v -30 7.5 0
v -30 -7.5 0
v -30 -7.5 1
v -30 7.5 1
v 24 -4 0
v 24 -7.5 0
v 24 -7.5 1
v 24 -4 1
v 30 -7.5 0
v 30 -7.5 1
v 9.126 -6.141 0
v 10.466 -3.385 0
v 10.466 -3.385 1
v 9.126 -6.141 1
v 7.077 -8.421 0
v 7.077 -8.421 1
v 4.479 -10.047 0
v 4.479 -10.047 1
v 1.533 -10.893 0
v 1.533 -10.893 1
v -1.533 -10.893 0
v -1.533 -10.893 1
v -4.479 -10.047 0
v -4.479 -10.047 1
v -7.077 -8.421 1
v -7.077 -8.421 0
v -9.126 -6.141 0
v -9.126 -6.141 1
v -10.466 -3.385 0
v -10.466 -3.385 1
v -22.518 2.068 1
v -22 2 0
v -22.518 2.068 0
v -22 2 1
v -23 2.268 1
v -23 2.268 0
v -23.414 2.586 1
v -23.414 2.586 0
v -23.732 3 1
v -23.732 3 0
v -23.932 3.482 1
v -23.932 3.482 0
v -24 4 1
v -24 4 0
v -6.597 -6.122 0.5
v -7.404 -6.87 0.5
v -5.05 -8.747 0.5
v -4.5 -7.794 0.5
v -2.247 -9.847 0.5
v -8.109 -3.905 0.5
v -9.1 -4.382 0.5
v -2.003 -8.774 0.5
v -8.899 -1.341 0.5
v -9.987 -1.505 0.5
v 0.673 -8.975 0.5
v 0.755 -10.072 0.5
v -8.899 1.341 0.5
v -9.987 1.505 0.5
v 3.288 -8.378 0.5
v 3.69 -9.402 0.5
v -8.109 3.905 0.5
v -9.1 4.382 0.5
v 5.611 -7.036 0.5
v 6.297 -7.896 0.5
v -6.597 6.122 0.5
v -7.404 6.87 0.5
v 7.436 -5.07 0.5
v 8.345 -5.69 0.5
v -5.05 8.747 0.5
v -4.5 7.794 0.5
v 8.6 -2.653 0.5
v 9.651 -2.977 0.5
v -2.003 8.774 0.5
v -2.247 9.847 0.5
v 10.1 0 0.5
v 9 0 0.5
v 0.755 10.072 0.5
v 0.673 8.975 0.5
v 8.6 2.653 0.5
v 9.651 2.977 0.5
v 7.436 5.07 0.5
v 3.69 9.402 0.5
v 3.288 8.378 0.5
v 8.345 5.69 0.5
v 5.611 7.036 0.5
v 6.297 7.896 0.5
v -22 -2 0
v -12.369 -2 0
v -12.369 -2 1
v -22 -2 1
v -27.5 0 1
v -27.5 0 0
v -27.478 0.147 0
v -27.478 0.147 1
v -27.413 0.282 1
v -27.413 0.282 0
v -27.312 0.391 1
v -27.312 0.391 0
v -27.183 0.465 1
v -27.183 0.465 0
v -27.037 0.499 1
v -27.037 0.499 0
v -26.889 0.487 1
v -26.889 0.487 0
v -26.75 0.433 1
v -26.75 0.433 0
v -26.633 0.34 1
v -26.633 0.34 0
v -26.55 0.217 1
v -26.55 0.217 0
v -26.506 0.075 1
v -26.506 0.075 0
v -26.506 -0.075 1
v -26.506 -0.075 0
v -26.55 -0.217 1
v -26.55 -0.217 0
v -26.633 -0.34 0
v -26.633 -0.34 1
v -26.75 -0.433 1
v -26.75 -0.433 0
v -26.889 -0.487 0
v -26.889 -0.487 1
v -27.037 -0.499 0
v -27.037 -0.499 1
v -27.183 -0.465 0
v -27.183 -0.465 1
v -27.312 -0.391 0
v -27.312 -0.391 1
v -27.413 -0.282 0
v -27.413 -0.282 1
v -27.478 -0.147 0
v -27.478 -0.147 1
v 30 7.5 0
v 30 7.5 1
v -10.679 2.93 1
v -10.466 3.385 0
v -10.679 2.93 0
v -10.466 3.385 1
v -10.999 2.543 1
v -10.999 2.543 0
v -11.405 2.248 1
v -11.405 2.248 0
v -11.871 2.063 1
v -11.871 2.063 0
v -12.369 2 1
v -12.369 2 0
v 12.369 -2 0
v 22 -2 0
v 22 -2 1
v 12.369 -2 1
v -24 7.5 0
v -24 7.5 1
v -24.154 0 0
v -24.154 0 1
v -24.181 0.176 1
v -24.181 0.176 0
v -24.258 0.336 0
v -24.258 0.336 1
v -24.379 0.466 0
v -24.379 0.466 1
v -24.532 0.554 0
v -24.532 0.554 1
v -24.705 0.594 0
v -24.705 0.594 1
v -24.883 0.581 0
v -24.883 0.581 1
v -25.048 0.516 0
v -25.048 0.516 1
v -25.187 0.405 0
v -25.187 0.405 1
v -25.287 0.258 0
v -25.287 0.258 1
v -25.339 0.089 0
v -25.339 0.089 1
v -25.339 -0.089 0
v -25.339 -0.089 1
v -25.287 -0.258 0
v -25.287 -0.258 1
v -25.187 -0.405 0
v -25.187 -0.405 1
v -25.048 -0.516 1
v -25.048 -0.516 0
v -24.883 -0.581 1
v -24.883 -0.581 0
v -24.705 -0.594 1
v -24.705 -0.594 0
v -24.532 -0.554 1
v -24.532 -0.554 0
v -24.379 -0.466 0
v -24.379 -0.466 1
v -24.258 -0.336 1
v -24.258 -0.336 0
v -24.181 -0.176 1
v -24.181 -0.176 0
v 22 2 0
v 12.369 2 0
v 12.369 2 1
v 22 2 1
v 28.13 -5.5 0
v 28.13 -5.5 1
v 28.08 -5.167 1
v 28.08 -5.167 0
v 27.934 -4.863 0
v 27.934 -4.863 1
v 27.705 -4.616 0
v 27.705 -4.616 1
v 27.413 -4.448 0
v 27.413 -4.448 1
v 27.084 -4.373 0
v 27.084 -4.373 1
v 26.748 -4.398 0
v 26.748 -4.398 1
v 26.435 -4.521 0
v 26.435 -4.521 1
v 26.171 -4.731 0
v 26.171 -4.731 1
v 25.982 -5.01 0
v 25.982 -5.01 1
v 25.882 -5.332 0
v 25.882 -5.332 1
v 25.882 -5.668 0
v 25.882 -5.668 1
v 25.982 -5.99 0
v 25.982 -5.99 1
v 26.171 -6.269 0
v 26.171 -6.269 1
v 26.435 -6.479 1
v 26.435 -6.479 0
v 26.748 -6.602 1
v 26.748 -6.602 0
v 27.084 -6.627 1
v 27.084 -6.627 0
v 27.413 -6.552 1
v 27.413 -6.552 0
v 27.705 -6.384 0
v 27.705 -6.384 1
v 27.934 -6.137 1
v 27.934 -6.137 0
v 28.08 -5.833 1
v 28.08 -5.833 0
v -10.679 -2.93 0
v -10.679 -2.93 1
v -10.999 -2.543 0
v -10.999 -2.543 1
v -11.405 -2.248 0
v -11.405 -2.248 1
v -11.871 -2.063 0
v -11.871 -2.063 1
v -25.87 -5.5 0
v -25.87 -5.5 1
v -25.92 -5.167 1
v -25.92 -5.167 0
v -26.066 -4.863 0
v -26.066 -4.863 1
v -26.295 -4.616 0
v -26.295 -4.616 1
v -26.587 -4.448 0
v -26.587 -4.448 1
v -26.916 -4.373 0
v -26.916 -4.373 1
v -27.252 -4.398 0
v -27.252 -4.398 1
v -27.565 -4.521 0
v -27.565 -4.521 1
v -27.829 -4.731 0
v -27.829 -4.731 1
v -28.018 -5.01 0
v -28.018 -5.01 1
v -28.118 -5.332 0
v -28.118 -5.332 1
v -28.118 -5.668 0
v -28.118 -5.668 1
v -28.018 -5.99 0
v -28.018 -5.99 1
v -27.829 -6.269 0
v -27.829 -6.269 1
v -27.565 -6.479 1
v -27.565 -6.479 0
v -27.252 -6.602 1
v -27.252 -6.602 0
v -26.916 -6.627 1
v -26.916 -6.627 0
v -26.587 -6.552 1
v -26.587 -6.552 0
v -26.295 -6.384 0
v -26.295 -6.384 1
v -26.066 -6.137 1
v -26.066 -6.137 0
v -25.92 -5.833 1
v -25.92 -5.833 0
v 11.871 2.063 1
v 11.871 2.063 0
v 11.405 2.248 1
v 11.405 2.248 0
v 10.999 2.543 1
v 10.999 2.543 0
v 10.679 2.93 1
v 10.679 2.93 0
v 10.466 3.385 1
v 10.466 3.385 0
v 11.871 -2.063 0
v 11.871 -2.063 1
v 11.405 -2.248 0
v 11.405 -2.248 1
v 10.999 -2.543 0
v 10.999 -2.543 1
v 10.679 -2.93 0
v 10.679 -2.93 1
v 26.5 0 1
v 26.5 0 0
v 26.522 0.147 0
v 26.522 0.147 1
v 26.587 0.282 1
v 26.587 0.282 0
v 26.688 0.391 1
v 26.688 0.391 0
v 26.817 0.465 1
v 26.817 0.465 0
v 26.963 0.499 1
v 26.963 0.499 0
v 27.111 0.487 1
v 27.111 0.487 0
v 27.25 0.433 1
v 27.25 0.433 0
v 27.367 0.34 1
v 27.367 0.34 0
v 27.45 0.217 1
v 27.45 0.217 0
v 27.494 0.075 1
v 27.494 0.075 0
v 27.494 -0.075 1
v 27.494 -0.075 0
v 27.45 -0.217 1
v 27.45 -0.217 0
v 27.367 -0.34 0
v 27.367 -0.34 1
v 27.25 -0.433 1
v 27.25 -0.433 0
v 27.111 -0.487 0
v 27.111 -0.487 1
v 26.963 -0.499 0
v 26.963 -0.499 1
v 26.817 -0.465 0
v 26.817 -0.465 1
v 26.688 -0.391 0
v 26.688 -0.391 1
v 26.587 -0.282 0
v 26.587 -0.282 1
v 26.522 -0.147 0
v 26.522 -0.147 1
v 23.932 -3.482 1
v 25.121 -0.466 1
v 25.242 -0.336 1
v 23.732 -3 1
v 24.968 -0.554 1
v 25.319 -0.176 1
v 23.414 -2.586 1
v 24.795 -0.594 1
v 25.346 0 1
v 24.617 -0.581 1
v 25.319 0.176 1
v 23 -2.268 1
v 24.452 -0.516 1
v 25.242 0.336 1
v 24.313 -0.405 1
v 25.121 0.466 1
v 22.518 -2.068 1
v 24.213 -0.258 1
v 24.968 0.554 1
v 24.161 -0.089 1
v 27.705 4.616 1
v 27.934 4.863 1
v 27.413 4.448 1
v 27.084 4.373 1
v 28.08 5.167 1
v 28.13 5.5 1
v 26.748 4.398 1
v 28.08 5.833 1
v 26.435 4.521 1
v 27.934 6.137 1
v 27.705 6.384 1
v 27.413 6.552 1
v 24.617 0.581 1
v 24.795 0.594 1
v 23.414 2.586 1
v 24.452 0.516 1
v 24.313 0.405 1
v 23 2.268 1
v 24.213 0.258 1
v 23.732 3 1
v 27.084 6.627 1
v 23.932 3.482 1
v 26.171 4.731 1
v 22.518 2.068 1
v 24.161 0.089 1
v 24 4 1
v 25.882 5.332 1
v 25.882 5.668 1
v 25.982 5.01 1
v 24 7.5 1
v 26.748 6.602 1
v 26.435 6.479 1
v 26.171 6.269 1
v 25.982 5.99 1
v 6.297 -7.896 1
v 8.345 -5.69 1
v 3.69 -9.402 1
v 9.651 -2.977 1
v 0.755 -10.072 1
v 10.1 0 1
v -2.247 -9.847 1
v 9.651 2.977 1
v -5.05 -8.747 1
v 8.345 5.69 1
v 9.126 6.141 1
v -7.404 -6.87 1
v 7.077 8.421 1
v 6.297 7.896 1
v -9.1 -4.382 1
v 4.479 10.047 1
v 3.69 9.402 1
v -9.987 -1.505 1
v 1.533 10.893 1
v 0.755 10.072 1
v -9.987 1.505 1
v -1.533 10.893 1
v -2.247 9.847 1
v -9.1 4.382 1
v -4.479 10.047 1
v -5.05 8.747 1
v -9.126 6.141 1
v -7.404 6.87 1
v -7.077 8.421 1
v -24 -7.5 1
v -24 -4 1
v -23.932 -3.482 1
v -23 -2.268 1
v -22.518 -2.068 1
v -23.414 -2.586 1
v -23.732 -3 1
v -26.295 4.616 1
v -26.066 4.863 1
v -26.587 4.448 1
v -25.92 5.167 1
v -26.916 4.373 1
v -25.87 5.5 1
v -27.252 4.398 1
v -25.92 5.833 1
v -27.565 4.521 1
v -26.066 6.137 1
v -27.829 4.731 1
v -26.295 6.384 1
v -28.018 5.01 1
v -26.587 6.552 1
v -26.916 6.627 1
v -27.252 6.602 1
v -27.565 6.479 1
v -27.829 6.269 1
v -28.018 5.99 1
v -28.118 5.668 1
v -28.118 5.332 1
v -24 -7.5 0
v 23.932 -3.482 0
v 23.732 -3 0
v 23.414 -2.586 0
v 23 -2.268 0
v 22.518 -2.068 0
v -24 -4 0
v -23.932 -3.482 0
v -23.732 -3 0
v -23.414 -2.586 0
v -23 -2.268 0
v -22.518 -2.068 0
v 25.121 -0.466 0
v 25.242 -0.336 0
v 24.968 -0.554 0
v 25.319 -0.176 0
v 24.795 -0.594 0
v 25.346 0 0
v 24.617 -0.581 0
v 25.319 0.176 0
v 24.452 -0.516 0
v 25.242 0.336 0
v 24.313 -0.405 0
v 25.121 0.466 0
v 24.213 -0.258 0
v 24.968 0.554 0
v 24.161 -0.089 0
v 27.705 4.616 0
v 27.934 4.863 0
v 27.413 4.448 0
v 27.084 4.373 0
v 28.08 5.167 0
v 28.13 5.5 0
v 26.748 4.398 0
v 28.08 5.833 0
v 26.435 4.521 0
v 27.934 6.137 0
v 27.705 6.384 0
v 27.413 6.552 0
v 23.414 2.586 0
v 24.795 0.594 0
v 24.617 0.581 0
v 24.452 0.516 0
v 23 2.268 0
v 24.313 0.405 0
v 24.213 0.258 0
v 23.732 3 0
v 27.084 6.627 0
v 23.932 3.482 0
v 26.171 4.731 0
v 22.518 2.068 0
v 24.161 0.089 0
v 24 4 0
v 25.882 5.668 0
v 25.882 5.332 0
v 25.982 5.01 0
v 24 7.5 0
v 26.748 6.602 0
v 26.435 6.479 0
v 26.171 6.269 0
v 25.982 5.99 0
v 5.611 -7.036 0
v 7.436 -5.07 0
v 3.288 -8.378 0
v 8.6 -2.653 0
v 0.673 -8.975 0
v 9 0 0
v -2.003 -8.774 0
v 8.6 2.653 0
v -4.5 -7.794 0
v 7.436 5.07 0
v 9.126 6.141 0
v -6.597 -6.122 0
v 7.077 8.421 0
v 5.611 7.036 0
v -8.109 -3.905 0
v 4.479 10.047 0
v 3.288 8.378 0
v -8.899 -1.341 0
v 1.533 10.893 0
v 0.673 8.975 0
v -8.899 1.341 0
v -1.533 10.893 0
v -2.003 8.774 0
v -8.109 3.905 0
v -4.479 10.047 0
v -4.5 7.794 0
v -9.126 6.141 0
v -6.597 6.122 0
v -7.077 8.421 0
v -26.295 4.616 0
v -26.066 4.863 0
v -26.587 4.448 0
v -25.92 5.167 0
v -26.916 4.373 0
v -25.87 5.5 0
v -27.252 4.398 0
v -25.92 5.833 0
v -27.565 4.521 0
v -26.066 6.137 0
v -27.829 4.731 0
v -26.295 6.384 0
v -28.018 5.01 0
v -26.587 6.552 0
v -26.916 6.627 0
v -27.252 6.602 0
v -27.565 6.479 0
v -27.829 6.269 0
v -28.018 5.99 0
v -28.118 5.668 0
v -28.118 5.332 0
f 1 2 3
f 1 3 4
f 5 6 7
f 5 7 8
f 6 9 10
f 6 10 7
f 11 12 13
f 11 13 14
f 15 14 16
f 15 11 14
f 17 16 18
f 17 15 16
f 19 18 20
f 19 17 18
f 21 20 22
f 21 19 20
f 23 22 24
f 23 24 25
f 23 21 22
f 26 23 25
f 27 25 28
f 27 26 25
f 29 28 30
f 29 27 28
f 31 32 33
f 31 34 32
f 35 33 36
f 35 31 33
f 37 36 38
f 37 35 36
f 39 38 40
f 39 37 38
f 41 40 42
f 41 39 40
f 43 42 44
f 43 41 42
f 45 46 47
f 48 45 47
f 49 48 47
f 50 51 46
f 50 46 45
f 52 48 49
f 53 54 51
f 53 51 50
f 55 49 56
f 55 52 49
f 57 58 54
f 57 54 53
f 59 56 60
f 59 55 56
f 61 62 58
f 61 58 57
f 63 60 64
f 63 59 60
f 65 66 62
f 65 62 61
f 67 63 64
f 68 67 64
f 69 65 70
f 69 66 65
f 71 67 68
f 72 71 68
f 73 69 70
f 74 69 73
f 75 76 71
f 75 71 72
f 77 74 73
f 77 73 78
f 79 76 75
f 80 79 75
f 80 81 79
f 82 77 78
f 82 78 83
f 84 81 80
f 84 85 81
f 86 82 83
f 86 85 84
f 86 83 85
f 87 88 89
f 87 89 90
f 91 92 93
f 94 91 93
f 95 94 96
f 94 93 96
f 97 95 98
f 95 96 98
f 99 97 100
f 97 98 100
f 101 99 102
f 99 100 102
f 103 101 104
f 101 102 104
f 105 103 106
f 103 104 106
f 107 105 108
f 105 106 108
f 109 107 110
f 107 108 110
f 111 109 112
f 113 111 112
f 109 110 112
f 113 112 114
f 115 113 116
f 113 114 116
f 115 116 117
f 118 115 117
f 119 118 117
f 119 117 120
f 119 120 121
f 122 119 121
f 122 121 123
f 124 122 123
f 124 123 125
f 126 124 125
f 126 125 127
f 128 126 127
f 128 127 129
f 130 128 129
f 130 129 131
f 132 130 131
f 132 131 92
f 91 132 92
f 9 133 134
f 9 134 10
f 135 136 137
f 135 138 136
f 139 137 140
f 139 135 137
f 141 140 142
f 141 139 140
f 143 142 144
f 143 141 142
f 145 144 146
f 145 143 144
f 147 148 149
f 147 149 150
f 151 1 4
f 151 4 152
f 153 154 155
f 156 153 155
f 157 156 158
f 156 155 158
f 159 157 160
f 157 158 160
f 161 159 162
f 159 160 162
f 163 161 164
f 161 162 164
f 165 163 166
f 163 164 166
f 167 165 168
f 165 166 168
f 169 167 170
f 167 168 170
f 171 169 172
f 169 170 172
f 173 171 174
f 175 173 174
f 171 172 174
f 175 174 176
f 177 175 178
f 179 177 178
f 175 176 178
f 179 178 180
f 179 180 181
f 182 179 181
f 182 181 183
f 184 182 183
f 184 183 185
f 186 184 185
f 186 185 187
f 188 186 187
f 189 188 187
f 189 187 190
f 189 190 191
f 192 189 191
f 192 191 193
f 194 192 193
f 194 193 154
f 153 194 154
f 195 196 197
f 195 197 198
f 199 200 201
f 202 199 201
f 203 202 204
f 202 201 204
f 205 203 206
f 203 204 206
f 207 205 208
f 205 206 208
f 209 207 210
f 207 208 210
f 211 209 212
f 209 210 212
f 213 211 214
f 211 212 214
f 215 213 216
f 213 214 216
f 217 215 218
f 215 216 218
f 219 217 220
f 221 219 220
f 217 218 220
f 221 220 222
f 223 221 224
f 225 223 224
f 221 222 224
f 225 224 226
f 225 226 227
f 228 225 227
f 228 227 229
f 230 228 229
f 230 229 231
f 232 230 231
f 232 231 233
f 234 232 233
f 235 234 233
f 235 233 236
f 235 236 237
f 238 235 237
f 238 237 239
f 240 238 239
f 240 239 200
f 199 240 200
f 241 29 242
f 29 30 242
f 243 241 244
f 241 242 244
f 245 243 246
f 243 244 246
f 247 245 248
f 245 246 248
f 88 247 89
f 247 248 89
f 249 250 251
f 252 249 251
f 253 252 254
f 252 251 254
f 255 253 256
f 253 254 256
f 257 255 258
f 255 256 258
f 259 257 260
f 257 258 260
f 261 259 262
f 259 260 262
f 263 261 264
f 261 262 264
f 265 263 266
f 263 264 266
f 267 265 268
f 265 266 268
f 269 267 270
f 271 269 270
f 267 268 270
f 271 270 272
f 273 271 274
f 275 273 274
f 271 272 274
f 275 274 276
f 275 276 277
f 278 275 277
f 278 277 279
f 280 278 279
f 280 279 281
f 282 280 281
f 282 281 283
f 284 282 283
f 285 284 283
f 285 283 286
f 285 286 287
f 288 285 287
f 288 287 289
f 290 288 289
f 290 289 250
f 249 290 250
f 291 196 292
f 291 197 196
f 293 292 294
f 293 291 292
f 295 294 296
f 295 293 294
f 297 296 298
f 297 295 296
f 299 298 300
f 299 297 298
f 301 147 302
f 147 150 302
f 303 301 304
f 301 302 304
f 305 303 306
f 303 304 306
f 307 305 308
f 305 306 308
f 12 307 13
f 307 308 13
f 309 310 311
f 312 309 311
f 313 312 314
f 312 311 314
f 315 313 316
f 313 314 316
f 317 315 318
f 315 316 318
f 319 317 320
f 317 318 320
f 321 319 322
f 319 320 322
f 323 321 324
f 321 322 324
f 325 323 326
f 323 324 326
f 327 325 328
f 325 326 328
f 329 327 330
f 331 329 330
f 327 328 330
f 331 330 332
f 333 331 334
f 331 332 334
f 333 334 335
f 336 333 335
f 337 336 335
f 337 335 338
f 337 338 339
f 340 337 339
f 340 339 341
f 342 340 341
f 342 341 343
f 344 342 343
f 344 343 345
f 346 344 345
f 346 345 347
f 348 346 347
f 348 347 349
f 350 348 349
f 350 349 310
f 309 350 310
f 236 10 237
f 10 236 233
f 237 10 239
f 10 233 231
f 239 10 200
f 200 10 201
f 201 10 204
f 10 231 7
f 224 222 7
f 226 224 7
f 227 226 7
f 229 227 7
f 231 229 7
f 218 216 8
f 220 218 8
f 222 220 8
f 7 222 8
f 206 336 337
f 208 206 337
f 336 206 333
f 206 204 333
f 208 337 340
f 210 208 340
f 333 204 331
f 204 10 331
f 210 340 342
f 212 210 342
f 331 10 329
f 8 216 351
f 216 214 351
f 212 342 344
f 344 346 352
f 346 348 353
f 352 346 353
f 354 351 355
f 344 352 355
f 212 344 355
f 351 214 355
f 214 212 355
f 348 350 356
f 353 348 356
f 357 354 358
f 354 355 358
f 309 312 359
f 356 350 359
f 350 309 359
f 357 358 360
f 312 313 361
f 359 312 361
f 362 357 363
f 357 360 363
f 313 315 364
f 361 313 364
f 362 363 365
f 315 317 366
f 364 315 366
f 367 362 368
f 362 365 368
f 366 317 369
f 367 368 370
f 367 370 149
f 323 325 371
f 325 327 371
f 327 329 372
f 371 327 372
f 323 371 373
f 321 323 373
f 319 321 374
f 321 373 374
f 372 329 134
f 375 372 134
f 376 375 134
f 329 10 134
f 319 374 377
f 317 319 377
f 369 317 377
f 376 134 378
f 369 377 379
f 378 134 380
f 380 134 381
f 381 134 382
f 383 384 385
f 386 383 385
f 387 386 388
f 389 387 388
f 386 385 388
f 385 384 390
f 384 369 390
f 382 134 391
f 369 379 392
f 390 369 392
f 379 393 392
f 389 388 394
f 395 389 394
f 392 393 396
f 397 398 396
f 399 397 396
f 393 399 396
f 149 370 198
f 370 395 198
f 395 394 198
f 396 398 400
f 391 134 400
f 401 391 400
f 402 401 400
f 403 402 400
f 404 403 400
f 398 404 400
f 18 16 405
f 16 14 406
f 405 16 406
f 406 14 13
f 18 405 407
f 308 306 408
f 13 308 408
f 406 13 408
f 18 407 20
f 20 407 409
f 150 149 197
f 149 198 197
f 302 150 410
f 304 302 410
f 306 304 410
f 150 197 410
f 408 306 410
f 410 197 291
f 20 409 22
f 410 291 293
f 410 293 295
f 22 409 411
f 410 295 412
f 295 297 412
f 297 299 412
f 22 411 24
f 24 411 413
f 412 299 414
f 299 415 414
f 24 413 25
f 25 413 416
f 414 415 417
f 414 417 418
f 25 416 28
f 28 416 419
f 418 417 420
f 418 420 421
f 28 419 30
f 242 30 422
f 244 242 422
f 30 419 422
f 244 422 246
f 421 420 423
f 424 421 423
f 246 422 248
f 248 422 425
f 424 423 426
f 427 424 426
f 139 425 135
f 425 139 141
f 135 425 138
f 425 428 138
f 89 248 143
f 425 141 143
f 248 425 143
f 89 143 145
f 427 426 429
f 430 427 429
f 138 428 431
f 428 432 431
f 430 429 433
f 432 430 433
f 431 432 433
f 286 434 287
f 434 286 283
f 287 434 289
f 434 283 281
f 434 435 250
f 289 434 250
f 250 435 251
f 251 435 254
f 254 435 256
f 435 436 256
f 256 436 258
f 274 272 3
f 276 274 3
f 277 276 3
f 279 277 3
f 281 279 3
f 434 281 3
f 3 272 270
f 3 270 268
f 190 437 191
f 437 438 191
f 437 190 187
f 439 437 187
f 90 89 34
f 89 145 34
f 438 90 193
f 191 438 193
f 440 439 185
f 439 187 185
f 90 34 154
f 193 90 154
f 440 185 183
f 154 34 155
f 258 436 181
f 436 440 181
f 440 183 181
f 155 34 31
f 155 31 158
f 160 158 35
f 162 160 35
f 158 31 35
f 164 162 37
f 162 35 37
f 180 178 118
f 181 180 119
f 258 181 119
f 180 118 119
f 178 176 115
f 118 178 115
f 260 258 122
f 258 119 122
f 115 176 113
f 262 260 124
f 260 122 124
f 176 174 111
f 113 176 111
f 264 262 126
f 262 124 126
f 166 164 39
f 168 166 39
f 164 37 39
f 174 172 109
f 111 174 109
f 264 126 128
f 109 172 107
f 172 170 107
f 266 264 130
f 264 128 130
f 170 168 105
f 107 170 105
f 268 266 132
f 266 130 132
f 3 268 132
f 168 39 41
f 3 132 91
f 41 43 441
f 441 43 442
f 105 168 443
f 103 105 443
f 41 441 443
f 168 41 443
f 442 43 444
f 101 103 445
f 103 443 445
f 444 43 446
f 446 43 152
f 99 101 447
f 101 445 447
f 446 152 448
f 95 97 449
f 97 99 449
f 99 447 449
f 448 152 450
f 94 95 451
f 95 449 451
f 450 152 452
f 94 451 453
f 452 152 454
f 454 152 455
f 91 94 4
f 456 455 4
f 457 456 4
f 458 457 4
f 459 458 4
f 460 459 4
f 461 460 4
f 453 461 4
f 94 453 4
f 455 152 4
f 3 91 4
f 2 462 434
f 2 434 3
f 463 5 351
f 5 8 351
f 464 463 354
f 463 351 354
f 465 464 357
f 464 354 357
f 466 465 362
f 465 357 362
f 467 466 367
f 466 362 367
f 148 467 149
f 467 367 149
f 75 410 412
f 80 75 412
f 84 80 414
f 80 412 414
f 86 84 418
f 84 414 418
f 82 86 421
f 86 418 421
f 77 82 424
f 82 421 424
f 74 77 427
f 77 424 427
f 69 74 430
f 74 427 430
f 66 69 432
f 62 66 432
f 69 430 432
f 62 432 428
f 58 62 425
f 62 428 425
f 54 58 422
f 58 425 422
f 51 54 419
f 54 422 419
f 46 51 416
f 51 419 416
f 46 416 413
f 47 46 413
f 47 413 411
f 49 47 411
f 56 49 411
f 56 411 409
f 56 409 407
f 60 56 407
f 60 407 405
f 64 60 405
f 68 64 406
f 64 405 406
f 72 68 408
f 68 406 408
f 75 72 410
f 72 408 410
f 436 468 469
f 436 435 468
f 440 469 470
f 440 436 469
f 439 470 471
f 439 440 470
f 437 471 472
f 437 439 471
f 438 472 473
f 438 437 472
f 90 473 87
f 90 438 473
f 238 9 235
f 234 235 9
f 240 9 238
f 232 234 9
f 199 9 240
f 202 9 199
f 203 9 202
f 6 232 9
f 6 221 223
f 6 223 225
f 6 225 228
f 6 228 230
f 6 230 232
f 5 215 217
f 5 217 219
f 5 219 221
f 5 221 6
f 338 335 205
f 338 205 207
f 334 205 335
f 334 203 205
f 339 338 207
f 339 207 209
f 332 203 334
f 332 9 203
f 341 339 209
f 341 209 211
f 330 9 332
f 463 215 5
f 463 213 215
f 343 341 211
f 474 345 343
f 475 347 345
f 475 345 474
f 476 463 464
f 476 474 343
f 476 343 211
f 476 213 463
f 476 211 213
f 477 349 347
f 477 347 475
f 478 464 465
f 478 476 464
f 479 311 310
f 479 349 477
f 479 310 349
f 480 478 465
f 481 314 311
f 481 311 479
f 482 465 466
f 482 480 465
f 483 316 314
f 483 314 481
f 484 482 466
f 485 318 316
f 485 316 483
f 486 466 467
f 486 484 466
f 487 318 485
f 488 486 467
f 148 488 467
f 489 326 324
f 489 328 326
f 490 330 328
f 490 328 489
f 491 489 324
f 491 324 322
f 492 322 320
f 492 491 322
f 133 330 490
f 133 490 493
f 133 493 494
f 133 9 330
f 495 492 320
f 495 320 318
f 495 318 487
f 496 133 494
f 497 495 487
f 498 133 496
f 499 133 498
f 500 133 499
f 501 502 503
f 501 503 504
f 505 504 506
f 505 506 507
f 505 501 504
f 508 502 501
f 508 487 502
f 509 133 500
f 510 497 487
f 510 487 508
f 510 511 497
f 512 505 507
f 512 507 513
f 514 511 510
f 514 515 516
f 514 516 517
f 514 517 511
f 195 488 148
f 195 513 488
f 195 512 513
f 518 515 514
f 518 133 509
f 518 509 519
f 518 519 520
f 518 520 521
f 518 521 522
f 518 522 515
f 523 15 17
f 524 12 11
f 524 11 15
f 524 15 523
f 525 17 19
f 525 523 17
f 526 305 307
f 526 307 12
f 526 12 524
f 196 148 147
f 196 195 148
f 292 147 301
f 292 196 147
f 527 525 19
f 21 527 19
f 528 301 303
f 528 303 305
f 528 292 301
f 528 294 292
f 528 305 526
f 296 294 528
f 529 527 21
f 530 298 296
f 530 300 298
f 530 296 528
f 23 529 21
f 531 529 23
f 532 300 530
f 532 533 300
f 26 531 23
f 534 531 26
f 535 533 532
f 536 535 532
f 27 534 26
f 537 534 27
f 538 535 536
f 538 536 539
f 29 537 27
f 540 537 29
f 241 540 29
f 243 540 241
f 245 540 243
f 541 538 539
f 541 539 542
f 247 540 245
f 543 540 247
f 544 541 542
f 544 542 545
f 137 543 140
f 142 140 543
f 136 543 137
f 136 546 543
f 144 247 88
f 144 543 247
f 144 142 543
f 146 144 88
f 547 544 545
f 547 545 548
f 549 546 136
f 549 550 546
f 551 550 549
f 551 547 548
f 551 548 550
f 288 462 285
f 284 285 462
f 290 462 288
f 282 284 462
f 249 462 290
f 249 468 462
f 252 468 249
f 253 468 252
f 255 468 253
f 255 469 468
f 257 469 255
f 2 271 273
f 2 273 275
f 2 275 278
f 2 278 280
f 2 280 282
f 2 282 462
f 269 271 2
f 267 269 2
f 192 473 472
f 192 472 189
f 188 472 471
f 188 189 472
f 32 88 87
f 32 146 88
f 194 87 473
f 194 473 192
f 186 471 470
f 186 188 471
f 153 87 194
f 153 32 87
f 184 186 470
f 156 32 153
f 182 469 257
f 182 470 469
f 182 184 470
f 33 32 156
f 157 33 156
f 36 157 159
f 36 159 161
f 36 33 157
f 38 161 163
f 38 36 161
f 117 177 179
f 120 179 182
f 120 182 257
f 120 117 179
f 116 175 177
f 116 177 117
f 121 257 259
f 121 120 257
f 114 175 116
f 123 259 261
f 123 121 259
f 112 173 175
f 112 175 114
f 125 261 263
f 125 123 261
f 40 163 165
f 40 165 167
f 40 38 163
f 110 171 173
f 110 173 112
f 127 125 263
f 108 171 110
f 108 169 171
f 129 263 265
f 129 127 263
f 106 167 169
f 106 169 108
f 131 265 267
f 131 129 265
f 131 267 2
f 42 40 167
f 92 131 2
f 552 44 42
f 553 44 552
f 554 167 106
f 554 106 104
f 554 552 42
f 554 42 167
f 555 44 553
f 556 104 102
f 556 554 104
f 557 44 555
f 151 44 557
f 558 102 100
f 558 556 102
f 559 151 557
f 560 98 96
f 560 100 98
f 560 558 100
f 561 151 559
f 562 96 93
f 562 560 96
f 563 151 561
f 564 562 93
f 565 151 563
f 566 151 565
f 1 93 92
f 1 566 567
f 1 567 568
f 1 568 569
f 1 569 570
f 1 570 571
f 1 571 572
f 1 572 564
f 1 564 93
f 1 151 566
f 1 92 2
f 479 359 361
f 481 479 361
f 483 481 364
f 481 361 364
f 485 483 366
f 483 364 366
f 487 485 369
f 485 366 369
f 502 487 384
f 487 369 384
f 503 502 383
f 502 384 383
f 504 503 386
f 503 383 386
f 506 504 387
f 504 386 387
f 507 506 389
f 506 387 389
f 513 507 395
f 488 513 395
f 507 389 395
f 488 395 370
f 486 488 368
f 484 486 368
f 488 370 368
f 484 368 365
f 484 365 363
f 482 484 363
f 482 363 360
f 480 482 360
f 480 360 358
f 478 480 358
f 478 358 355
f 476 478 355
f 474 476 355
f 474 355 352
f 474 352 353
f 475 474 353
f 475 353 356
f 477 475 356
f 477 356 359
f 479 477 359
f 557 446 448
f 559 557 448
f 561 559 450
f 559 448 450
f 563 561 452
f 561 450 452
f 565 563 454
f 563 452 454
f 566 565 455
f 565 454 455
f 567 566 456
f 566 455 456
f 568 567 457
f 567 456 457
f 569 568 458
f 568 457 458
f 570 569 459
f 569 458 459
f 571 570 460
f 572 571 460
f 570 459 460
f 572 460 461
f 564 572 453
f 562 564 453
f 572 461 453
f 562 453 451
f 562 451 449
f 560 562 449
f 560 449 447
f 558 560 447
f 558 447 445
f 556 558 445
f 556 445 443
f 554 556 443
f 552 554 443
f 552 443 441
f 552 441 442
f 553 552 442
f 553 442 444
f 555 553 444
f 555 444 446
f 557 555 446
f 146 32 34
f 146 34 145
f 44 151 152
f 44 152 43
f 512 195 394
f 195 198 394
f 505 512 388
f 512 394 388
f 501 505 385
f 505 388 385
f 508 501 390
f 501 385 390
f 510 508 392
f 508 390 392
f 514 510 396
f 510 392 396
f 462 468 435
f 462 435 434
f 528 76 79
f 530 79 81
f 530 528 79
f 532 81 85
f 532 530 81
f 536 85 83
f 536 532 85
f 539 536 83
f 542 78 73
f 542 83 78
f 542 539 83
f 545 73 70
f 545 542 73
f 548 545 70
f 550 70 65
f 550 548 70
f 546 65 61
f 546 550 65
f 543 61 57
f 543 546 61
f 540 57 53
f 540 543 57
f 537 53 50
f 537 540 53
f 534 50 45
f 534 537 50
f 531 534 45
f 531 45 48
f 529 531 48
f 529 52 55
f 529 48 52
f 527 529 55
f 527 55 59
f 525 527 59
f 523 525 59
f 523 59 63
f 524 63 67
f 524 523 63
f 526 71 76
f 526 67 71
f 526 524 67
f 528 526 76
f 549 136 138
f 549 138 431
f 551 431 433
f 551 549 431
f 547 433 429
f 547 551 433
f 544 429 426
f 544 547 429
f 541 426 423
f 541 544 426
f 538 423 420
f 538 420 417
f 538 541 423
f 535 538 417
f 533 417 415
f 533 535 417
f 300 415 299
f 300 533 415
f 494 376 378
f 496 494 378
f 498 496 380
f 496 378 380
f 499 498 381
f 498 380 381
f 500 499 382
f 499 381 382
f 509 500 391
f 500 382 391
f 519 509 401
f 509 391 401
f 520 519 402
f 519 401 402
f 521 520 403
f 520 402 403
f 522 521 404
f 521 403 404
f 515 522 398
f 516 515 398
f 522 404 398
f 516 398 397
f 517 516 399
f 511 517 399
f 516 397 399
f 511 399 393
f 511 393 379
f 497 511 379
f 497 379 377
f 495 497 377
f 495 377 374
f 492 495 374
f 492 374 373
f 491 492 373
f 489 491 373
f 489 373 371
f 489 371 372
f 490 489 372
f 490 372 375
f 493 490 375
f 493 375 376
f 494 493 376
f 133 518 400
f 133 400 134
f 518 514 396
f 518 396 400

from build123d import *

# Parameters (mm, degrees)
SKETCH1_R             = 9
BOSS_EXTRUDE1_DEPTH   = 1
SKETCH2_R             = 10.1
CUT_EXTRUDE1_DEPTH    = 0.5
SKETCH6_R             = 0.5
CUT_EXTRUDE3_DEPTH    = 32.968734726
F_1_CLEARANCE_HOLE1_D = 2.2606
F_0_80_TAPPED_HOLE1_D = 1.19126
FILLET1_R             = 2


with BuildPart() as part:
    # Sketch1 → Boss-Extrude1 (new body)
    with BuildSketch(Plane.XY):
        with BuildLine():
            Line((10.816653826, 2), (24, 2))
            Line((24, 2), (24, 7.5))
            Line((24, 7.5), (30, 7.5))
            Line((30, 7.5), (30, -7.5))
            Line((30, -7.5), (24, -7.5))
            Line((24, -7.5), (24, -2))
            Line((24, -2), (10.816653826, -2))
            ThreePointArc((10.816653826, -2), (0, -11), (-10.816653826, -2))
            Line((-10.816653826, -2), (-24, -2))
            Line((-24, -2), (-24, -7.5))
            Line((-24, -7.5), (-30, -7.5))
            Line((-30, -7.5), (-30, 7.5))
            Line((-30, 7.5), (-24, 7.5))
            Line((-24, 7.5), (-24, 2))
            Line((-24, 2), (-10.816653826, 2))
            ThreePointArc((-10.816653826, 2), (0, 11), (10.816653826, 2))
        make_face()
        Circle(SKETCH1_R, mode=Mode.SUBTRACT)
    extrude(amount=BOSS_EXTRUDE1_DEPTH)

    # Sketch2 → Cut-Extrude1 (cut)
    with BuildSketch(Plane.XY.offset(1)):
        Circle(SKETCH2_R)
    extrude(amount=-CUT_EXTRUDE1_DEPTH, mode=Mode.SUBTRACT)

    # Sketch6 → Cut-Extrude3 (cut, through all)
    with BuildSketch(Plane(origin=(0, 0, 0), x_dir=(-1, 0, 0), z_dir=(0, 0, -1))):
        with Locations((-27, 0)):
            Circle(SKETCH6_R)
        with Locations((27, 0)):
            Circle(SKETCH6_R)
    extrude(amount=-CUT_EXTRUDE3_DEPTH, mode=Mode.SUBTRACT)

    # #1 Clearance Hole1 (through all)
    with Locations(Plane(origin=(0, 0, 0), x_dir=(-1, 0, 0), z_dir=(0, 0, -1))):
        with Locations((-27, -5.5), (-27, 5.5), (27, 5.5), (27, -5.5)):
            Hole(F_1_CLEARANCE_HOLE1_D / 2)

    # #0-80 Tapped Hole1 (through all)
    with Locations(Plane(origin=(0, 0, 0), x_dir=(-1, 0, 0), z_dir=(0, 0, -1))):
        with Locations((-24.75, 0), (24.75, 0)):
            Hole(F_0_80_TAPPED_HOLE1_D / 2)

    # Fillet1
    fillet1_edges = [part.edges().sort_by_distance(p)[0] for p in [
        (-24, 2, 0.5),
        (-10.816653826, 2, 0.5),
        (10.816653826, 2, 0.5),
        (24, 2, 0.5),
        (24, -2, 0.5),
        (10.816653826, -2, 0.5),
        (-10.816653826, -2, 0.5),
        (-24, -2, 0.5),
    ]]
    fillet(fillet1_edges, radius=FILLET1_R)


solid = part.part
